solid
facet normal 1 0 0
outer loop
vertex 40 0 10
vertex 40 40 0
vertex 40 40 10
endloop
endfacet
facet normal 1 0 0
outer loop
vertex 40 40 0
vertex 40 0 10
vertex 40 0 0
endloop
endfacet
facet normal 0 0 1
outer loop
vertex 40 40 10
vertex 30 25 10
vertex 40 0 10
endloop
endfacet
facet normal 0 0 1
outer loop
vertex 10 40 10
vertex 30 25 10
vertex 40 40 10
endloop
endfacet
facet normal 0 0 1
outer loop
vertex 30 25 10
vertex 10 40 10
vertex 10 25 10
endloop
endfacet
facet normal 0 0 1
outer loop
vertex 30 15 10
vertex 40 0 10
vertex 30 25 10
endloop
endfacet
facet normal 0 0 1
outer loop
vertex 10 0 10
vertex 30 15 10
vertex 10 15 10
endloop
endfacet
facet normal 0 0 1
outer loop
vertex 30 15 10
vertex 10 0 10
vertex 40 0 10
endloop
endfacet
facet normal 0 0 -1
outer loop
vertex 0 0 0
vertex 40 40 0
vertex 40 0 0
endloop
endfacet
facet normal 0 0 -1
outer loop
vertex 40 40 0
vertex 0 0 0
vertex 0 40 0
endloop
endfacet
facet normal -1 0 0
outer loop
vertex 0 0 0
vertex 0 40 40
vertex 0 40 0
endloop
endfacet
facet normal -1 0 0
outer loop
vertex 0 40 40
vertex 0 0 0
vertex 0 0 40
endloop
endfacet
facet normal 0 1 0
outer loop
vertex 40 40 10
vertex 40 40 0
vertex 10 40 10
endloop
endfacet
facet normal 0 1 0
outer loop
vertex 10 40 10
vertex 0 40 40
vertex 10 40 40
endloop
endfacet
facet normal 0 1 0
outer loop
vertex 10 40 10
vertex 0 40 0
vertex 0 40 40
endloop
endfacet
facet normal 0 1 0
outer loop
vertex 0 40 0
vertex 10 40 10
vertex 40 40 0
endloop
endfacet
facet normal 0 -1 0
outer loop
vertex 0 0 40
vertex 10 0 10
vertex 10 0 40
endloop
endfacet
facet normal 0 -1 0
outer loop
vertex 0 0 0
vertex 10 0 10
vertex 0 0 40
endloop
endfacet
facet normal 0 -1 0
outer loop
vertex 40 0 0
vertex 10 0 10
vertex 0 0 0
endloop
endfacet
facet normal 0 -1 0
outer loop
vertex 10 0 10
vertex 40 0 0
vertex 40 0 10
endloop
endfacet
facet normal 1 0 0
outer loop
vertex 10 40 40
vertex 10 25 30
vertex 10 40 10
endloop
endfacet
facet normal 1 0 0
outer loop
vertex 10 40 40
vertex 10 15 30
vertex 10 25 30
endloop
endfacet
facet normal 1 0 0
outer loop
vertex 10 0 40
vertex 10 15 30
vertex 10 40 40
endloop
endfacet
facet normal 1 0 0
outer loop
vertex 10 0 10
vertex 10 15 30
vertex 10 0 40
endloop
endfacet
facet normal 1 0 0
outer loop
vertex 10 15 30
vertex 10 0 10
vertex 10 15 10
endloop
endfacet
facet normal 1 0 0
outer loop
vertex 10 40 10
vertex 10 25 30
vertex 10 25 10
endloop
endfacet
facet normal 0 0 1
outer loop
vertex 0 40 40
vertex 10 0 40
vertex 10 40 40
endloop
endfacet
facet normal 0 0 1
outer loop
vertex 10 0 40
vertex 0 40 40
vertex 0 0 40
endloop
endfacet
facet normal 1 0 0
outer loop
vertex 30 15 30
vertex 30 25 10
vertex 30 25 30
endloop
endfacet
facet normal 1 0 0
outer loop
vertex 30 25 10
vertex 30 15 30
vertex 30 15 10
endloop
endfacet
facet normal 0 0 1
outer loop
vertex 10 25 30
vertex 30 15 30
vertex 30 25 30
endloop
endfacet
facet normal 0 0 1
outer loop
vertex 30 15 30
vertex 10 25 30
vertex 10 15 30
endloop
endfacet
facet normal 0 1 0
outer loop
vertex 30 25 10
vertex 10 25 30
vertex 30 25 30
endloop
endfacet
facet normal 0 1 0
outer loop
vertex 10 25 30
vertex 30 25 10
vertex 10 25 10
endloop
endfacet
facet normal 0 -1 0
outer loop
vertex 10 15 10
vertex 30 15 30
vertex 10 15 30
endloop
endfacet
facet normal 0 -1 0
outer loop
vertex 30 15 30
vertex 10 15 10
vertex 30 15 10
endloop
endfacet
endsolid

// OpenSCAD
union(){
cube([40,40,10]);
cube([10,40,40]);
translate([10,15,10])
cube([20,10,20]);
}
